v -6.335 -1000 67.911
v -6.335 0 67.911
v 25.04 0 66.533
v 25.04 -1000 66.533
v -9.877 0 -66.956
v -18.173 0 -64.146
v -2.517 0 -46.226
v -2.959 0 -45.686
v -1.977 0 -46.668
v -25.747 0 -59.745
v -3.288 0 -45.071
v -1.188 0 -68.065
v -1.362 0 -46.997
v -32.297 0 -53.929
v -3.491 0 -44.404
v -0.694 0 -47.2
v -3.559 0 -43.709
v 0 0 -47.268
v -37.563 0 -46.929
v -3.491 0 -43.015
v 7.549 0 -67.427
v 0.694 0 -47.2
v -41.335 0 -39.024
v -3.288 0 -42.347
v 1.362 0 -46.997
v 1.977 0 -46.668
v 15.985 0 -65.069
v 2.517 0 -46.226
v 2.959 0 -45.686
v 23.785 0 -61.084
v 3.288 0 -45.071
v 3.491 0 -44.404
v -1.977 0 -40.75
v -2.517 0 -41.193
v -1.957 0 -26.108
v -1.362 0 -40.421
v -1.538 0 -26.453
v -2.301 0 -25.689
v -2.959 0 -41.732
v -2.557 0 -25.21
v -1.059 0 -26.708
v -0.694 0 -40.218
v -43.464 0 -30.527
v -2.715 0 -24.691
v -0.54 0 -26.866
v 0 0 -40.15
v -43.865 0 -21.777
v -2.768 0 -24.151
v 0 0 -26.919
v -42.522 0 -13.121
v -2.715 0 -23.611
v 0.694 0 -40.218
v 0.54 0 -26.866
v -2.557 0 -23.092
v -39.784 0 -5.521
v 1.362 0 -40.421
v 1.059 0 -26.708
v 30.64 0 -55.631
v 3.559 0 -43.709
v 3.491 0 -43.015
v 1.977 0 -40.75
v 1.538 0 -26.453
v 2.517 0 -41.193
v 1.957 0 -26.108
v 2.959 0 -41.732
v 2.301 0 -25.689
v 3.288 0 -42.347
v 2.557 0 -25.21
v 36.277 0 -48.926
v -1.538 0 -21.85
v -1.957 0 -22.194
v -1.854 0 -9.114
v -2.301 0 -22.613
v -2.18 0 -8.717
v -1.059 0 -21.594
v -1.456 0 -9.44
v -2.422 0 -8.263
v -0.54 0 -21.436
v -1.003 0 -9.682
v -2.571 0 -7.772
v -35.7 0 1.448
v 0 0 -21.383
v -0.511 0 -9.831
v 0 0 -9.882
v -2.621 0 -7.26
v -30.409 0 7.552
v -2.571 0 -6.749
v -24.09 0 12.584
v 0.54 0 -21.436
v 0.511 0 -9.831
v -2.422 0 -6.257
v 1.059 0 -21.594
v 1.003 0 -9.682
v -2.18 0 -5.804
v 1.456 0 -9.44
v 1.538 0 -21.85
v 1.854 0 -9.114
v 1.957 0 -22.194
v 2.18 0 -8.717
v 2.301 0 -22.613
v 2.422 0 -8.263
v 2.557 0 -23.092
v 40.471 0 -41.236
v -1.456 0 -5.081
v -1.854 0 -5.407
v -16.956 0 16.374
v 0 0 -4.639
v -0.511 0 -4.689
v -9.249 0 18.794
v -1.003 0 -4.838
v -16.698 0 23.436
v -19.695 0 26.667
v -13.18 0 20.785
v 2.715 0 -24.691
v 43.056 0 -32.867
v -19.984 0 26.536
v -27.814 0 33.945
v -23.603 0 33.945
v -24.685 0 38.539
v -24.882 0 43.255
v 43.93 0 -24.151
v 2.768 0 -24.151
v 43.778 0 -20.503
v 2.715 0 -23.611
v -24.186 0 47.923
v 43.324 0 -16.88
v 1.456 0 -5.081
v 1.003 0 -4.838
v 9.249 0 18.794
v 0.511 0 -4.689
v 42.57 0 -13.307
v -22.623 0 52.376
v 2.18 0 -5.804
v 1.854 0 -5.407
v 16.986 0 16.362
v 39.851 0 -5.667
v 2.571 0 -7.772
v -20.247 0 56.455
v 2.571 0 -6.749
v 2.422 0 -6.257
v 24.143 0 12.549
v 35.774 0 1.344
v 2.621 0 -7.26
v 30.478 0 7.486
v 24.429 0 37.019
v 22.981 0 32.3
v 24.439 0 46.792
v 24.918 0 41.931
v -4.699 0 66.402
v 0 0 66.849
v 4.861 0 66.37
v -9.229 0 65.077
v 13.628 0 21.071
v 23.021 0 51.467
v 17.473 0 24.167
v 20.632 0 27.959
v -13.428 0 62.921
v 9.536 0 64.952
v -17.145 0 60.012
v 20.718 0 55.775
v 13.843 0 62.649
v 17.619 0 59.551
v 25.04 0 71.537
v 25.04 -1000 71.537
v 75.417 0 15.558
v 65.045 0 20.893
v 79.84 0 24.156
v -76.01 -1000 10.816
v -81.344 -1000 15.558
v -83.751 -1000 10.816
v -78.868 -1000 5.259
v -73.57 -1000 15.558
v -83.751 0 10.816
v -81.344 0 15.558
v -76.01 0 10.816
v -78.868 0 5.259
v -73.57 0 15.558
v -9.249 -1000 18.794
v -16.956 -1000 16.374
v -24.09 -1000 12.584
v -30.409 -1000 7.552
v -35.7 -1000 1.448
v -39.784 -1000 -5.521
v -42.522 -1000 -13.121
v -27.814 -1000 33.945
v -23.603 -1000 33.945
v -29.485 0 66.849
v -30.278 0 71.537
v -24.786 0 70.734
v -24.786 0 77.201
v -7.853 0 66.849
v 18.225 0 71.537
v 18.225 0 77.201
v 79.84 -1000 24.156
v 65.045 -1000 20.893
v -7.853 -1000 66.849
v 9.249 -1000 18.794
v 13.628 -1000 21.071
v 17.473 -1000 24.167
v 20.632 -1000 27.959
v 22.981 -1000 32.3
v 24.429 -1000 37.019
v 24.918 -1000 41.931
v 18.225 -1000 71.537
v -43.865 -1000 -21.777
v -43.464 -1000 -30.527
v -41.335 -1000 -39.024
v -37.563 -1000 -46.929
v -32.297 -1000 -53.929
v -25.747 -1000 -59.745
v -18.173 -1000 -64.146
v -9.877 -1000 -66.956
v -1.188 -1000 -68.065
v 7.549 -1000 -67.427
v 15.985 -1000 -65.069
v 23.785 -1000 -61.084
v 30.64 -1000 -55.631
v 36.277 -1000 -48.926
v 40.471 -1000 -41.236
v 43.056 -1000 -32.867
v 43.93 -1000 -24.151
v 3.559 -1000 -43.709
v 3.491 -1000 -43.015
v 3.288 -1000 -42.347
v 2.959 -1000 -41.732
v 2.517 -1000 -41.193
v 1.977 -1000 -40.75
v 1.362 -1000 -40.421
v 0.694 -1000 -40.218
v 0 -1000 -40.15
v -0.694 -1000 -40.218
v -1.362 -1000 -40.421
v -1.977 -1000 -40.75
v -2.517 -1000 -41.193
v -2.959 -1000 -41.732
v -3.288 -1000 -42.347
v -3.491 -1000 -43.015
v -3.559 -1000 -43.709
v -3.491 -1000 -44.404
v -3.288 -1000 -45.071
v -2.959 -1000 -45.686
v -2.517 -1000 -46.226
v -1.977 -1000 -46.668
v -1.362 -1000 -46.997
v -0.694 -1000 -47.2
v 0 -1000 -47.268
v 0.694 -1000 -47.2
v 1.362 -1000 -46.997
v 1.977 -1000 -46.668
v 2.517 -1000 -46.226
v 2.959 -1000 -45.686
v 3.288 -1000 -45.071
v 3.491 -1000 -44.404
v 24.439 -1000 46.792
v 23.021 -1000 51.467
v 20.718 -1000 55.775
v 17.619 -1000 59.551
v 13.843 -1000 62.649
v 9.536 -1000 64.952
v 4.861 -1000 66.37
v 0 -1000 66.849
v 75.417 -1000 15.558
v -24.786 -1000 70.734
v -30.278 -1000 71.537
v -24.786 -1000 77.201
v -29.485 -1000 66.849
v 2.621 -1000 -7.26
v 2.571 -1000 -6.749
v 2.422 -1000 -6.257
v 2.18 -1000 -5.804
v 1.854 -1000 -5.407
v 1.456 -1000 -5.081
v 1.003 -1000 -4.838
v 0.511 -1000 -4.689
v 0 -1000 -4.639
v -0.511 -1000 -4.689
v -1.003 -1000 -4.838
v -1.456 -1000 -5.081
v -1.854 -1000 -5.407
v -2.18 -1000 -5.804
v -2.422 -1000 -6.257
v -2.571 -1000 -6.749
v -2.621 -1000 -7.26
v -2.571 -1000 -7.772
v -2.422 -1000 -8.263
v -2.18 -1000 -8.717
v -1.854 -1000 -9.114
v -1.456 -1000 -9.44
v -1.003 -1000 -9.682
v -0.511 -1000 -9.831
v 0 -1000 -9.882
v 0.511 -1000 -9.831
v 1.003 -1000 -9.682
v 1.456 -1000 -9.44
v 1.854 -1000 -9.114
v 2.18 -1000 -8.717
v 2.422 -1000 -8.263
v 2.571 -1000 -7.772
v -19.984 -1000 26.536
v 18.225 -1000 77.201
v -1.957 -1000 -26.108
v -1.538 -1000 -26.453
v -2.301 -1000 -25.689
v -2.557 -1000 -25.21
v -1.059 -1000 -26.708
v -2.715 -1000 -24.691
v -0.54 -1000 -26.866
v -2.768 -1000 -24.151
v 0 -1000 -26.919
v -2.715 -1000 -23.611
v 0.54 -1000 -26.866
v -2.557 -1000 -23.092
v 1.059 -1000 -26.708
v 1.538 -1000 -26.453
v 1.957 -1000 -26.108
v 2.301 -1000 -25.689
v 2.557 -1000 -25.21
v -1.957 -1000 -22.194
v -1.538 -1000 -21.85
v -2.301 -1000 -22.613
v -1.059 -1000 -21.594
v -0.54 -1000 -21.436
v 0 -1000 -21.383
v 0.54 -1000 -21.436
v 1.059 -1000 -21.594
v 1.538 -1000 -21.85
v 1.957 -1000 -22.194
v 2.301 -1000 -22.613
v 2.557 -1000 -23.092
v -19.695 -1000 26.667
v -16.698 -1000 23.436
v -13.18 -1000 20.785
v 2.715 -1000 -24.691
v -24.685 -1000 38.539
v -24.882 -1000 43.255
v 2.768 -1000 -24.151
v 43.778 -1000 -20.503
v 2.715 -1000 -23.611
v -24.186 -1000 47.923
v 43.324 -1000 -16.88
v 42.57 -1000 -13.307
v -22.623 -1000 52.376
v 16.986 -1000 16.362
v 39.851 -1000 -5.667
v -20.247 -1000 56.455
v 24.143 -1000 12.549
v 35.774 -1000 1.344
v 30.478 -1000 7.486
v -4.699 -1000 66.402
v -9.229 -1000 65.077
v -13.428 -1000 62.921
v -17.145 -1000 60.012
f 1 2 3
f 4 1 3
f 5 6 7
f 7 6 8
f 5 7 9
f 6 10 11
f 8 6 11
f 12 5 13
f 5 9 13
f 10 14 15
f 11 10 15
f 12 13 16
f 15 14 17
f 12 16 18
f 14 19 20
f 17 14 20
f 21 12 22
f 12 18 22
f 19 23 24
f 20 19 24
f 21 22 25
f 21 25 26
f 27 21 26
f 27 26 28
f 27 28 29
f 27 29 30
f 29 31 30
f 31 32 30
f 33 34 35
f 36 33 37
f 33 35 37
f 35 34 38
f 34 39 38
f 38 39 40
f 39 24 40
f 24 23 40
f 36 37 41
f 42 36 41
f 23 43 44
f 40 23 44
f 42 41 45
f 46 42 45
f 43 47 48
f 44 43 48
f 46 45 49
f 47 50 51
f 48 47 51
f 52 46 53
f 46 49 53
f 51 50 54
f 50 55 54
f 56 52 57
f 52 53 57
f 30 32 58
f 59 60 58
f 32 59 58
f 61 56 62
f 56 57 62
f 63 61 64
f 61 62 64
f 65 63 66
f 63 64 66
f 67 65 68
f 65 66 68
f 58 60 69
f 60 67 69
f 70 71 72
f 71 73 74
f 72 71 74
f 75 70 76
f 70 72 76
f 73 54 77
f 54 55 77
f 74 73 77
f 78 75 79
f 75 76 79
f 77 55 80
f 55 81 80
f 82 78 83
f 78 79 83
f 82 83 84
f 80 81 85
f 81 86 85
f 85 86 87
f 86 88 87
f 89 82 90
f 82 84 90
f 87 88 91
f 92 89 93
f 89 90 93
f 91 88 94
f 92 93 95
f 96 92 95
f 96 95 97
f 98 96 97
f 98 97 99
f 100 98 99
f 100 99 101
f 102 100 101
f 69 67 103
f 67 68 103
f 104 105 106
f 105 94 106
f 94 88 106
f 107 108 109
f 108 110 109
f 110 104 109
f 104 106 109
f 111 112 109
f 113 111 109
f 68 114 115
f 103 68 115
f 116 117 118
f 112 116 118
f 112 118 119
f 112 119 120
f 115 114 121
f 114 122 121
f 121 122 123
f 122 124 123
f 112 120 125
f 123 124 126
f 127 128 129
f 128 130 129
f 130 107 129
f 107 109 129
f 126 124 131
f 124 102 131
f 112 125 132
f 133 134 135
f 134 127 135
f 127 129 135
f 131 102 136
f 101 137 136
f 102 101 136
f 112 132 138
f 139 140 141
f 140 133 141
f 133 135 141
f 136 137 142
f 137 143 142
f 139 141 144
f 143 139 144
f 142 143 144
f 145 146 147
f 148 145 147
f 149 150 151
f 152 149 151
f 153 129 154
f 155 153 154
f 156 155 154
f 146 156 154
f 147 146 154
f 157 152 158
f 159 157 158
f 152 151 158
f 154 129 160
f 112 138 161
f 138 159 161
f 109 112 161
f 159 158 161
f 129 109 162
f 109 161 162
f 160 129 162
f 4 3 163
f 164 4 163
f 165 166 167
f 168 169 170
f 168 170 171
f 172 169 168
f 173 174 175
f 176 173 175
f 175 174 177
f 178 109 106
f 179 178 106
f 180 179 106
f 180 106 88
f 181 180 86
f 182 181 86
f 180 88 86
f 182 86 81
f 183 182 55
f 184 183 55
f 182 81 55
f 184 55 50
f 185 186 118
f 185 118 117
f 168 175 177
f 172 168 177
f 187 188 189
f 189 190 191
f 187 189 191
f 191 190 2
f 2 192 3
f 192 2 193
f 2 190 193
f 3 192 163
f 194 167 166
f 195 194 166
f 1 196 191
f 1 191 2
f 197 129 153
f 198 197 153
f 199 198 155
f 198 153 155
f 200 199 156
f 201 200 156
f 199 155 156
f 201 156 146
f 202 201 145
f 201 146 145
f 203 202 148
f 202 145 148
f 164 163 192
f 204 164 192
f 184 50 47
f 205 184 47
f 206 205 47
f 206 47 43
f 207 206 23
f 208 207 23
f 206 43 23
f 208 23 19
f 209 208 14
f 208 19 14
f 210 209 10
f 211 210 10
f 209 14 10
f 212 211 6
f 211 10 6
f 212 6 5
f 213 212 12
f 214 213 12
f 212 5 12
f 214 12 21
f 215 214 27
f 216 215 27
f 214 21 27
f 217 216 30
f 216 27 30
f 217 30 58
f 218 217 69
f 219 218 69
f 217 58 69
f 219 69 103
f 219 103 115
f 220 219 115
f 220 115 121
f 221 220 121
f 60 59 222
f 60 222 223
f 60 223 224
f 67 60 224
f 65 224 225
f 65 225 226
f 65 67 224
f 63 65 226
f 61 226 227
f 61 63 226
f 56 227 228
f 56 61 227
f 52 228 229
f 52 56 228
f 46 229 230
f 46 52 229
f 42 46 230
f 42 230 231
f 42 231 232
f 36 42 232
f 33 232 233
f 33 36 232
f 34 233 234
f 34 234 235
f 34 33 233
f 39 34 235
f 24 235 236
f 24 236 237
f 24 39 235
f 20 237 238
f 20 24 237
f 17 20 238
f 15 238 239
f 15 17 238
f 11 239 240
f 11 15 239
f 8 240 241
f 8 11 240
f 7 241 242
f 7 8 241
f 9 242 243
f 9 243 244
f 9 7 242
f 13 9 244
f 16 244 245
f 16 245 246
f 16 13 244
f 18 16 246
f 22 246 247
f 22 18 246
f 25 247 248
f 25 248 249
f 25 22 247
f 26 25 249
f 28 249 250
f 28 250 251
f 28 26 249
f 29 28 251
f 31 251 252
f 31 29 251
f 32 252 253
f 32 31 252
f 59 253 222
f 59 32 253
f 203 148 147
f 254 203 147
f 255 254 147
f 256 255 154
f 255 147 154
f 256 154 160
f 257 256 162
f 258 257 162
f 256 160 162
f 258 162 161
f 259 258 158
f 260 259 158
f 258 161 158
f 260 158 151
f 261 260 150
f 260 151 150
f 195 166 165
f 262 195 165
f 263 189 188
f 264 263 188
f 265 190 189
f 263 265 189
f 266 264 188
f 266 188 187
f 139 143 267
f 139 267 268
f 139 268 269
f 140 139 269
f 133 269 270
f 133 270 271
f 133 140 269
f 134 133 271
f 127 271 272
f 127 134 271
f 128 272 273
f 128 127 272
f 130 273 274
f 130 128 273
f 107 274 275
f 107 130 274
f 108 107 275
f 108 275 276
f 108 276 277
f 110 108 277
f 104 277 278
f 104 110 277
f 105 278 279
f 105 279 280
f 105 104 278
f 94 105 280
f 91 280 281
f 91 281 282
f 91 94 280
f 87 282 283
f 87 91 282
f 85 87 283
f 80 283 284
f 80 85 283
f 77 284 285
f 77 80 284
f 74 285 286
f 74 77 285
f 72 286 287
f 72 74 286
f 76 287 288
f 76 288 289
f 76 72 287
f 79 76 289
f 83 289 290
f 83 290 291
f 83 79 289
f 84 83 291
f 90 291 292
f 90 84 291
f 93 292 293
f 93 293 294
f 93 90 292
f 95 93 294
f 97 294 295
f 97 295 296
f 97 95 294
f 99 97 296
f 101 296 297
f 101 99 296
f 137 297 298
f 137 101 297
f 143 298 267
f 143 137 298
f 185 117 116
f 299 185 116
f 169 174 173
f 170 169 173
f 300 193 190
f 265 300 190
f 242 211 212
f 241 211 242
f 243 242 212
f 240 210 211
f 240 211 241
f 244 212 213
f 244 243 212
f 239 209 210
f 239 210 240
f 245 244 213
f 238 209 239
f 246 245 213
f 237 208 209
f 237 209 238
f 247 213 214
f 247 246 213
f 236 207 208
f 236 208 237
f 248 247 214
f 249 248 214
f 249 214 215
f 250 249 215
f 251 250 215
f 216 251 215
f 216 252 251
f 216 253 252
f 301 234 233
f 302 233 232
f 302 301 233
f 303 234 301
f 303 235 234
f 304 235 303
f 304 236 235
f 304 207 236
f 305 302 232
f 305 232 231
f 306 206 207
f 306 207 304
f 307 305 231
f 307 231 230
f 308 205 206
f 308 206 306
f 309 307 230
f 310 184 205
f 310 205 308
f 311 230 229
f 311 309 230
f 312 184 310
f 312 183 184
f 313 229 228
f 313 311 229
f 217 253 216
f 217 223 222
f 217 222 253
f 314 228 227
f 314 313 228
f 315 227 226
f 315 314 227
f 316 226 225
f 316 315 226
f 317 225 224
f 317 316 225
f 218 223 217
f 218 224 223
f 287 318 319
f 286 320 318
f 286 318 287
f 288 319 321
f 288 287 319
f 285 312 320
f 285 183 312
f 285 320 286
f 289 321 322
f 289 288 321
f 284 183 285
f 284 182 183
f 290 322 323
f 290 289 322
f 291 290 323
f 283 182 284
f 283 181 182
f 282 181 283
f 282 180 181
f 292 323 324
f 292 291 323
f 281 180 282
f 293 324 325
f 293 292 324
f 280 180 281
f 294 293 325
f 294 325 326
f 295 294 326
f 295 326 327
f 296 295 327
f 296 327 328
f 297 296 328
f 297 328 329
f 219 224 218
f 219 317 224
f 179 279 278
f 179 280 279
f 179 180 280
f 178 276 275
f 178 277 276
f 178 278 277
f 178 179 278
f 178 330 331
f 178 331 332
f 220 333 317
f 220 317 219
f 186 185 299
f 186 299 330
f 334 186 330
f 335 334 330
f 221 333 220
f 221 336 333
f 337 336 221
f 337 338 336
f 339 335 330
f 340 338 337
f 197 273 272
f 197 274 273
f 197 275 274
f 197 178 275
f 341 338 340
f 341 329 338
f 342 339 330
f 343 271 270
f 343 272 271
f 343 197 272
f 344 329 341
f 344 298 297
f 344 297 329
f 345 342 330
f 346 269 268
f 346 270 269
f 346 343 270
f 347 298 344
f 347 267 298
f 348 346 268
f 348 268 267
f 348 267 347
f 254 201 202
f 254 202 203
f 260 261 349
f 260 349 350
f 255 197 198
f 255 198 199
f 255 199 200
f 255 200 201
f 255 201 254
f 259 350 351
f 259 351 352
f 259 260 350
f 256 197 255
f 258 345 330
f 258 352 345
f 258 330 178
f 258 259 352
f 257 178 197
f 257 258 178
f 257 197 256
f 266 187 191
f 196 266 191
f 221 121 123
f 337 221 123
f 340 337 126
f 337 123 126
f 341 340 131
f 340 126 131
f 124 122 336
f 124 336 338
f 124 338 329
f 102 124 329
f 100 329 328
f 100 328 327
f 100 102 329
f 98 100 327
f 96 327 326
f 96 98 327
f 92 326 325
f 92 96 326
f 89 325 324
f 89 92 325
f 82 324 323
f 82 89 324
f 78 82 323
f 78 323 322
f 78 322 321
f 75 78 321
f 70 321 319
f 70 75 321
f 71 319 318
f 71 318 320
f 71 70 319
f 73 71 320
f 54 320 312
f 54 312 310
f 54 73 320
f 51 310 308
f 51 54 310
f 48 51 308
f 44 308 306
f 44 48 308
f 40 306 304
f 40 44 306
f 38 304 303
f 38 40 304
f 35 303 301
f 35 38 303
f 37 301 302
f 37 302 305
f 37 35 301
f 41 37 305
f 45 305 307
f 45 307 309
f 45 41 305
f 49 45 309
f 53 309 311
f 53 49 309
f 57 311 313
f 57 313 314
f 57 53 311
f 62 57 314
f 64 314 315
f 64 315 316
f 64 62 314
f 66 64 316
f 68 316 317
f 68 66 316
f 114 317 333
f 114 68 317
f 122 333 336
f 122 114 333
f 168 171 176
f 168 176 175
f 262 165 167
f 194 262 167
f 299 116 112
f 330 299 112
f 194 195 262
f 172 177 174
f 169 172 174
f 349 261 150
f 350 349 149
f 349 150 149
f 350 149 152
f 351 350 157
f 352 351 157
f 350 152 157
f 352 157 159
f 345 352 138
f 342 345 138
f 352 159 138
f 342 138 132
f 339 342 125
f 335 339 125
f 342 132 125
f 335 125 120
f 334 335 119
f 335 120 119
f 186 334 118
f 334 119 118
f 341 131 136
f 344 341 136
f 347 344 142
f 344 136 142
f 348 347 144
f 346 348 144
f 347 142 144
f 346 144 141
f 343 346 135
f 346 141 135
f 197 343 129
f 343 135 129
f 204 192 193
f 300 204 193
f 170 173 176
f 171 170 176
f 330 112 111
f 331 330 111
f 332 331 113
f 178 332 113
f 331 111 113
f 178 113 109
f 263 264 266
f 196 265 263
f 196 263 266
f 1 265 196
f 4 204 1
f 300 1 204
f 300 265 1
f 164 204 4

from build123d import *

# Parameters (mm, degrees)
F0_R     = 3.559087352
F0_R_2   = 2.7679837305
F0_R_3   = 2.6213351788
F0_R_4   = 8.8899955153
F0_R_5   = 9.1287938565
F1_DEPTH = 1000


with BuildPart() as f1:
    # F0 (on Front) → F1 (new body)
    with BuildSketch(Plane.XZ):
        with BuildLine():
            ThreePointArc((-42.522289517, -13.1209784431), (-5.5598010496, -67.7275202598), (43.929604165, -24.1511650383))
            ThreePointArc((43.929604165, -24.1511650383), (43.5884245631, -18.6867925953), (42.5701853055, -13.3072983317))
            ThreePointArc((42.5701853055, -13.3072983317), (30.478272359, 7.485602118), (9.2489418796, 18.7937670981))
            ThreePointArc((9.2489418796, 18.7937670981), (0, 17.0136591141), (-9.2489418796, 18.7937670981))
            ThreePointArc((-9.2489418796, 18.7937670981), (-30.4089270744, 7.552261847), (-42.522289517, -13.1209784431))
        make_face()
        with Locations((0, -43.709166348)):
            Circle(F0_R, mode=Mode.SUBTRACT)
        with Locations((0, -24.1511650383)):
            Circle(F0_R_2, mode=Mode.SUBTRACT)
        with Locations((0, -7.2601665743)):
            Circle(F0_R_3, mode=Mode.SUBTRACT)
        with BuildLine():
            ThreePointArc((-9.2489418796, 18.7937670981), (0, 17.0136591141), (9.2489418796, 18.7937670981))
            ThreePointArc((9.2489418796, 18.7937670981), (0, 19.7784391267), (-9.2489418796, 18.7937670981))
        make_face()
        with BuildLine():
            ThreePointArc((-9.2489418796, 18.7937670981), (0, 19.7784391267), (9.2489418796, 18.7937670981))
            ThreePointArc((9.2489418796, 18.7937670981), (20.6318054946, 27.9593809067), (24.9175081308, 41.9311672449))
            ThreePointArc((24.9175081308, 41.9311672449), (17.6193389695, 59.5505062144), (0, 66.8486753757))
            ThreePointArc((0, 66.8486753757), (-20.2470624636, 56.4548951769), (-23.6029080517, 33.9446196208))
            Line((-23.6029080517, 33.9446196208), (-3.51480454, 33.9446196208))
            Line((-3.51480454, 33.9446196208), (-11.8889665349, 30.1777279181))
            Line((-11.8889665349, 30.1777279181), (-19.6945457834, 26.6665978821))
            ThreePointArc((-19.6945457834, 26.6665978821), (-14.9975576566, 22.0325372472), (-9.2489418796, 18.7937670981))
        make_face()
        with Locations((-9.0381670743, 46.3761650026)):
            Circle(F0_R_4, mode=Mode.SUBTRACT)
        with Locations((10.519833304, 46.3761650026)):
            Circle(F0_R_5, mode=Mode.SUBTRACT)
        with BuildLine():
            Line((-19.9842423259, 26.5362856785), (-19.6945457834, 26.6665978821))
            ThreePointArc((-19.6945457834, 26.6665978821), (-21.9524435373, 30.1425102311), (-23.6029080517, 33.9446196208))
            Line((-23.6029080517, 33.9446196208), (-27.814138809, 33.9446196208))
            Line((-27.814138809, 33.9446196208), (-19.9842423259, 26.5362856785))
        make_face()
        with BuildLine():
            ThreePointArc((-23.6029080517, 33.9446196208), (-21.9524435373, 30.1425102311), (-19.6945457834, 26.6665978821))
            Line((-19.6945457834, 26.6665978821), (-11.8889665349, 30.1777279181))
            Line((-11.8889665349, 30.1777279181), (-3.51480454, 33.9446196208))
            Line((-3.51480454, 33.9446196208), (-23.6029080517, 33.9446196208))
        make_face()
        with Locations((-9.0381670743, 46.3761650026)):
            Circle(F0_R_4)
        with Locations((10.519833304, 46.3761650026)):
            Circle(F0_R_5)
    extrude(amount=F1_DEPTH)


with BuildPart() as f1b:
    # F0 (on Front) → F1, piece 2 (new body)
    with BuildSketch(Plane.XZ):
        Polygon((-78.868268081, 5.2594794789), (-76.0095044971, 10.8161661774), (-83.7513430484, 10.8161661774), align=None)
        Polygon((-83.7513430484, 10.8161661774), (-76.0095044971, 10.8161661774), (-73.5702174304, 15.5575005338), (-81.3435018063, 15.5575005338), align=None)
    extrude(amount=F1_DEPTH)


with BuildPart() as f1c:
    # F0 (on Front) → F1, piece 3 (new body)
    with BuildSketch(Plane.XZ):
        Polygon((-29.4851679355, 66.8486753757), (-7.8528337181, 66.8486753757), (-6.3352061266, 67.9107309461), (25.0401664525, 66.5325298905), (25.0401664525, 71.5367647941), (18.2245001197, 71.5367647941), (18.2245001197, 77.201411128), (-24.7861540662, 77.201411128), (-24.7861540662, 70.7344174598), (-30.2779826288, 71.5367647941), align=None)
    extrude(amount=F1_DEPTH)


with BuildPart() as f1d:
    # F0 (on Front) → F1, piece 4 (new body)
    with BuildSketch(Plane.XZ):
        Polygon((65.045170486, 20.8934377879), (75.4168331623, 15.5575005338), (79.8404374607, 24.1558272027), align=None)
    extrude(amount=F1_DEPTH)


solid = Compound([f1.part, f1b.part, f1c.part, f1d.part])
